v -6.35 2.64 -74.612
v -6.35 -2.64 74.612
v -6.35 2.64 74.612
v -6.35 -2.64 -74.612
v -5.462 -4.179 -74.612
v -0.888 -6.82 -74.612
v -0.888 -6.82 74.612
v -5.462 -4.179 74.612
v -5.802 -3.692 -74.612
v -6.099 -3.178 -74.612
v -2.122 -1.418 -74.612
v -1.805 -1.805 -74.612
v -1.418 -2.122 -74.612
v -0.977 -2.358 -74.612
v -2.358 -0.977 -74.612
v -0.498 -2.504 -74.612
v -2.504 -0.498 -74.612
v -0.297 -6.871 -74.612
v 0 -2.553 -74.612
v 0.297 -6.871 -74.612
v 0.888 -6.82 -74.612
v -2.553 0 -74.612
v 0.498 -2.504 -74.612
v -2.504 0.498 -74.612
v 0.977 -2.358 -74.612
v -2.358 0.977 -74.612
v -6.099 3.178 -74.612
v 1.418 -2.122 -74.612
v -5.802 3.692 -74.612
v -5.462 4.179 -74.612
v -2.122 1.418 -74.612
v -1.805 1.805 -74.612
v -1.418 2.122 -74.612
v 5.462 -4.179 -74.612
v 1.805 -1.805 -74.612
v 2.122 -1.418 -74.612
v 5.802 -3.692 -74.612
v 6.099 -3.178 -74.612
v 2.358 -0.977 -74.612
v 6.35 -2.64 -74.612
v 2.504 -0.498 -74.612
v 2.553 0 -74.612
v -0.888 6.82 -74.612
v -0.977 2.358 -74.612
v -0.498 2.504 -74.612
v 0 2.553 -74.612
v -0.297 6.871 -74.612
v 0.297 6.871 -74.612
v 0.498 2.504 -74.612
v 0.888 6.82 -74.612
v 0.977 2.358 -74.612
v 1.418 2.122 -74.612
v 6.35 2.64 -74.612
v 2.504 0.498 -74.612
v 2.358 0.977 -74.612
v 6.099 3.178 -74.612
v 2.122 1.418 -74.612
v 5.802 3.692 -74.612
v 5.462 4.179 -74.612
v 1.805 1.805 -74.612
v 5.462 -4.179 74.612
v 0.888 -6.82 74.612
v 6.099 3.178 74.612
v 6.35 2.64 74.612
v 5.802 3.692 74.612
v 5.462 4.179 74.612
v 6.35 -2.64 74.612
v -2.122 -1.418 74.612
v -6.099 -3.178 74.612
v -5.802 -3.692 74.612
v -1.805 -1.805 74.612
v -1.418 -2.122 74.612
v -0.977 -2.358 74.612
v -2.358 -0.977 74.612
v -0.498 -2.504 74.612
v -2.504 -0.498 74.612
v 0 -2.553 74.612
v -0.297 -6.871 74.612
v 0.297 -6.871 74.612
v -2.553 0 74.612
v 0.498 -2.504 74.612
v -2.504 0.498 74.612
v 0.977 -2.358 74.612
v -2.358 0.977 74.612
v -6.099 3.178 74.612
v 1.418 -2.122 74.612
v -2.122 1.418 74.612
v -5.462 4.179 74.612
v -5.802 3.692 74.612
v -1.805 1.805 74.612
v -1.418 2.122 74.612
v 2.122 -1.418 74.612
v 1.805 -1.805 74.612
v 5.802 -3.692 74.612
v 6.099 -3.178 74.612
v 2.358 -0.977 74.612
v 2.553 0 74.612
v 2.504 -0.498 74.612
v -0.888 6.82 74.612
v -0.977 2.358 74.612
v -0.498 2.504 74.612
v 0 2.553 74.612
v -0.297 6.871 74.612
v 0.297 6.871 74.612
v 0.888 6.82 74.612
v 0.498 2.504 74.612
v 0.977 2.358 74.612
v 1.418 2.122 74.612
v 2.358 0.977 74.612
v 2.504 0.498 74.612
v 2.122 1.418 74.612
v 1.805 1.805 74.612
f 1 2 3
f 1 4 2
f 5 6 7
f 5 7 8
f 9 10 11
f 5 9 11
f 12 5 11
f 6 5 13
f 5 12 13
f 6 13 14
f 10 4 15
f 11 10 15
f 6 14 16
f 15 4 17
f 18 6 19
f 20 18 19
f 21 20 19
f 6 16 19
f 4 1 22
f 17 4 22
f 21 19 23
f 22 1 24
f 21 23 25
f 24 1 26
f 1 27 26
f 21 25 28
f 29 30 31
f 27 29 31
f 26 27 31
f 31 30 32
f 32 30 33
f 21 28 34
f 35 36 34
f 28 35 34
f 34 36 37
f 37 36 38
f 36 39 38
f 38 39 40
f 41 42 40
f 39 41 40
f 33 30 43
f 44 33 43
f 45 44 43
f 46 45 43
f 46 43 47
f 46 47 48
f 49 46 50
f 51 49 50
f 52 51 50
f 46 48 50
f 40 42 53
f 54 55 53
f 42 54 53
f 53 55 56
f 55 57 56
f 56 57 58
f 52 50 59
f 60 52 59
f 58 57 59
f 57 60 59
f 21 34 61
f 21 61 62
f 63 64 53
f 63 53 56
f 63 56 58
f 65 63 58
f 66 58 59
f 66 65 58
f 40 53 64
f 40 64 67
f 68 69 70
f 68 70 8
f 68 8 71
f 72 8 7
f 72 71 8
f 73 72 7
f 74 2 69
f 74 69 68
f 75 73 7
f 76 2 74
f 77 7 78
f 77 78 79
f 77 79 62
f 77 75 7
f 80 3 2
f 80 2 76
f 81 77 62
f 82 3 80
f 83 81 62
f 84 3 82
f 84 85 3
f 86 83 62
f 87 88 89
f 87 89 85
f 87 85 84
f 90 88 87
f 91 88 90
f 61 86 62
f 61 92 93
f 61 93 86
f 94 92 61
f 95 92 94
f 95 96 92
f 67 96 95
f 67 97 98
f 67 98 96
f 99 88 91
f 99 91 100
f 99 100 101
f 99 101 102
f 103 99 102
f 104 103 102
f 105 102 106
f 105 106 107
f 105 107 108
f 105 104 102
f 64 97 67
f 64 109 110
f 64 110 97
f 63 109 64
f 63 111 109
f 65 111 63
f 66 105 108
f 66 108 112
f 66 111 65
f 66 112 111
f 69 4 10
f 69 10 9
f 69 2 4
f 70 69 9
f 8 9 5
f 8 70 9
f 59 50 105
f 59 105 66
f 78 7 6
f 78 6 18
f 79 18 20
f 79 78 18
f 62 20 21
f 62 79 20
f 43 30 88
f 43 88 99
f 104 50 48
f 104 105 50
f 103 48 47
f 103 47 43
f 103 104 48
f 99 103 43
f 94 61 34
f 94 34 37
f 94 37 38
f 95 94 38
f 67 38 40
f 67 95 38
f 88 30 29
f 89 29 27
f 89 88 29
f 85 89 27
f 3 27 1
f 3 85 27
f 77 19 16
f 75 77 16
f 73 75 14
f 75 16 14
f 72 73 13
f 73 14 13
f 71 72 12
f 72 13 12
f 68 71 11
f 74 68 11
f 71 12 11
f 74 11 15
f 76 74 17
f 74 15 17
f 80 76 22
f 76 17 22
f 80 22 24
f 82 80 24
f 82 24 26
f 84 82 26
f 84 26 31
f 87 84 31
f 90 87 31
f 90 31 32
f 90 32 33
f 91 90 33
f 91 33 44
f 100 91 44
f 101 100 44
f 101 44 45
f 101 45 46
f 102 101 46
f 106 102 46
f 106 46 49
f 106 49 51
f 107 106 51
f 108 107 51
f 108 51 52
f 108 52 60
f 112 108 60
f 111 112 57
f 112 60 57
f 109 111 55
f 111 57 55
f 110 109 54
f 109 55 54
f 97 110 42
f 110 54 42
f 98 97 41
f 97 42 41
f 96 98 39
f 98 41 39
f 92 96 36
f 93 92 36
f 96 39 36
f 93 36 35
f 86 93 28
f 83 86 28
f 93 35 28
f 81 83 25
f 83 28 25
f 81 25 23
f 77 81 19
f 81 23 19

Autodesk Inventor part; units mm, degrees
ref_plane "YZ Plane" through (0, 0, 0) normal (1, 0, 0) x (0, 1, 0)
ref_plane "XZ Plane" through (0, 0, 0) normal (0, 1, 0) x (-1, 0, 0)
ref_plane "XY Plane" through (0, 0, 0) normal (0, 0, 1) x (1, 0, 0)
sketch "Sketch1" plane through (0, 0, 0) normal (0, 0, 1) x (1, 0, 0)
  line L0 (-6.35, -3.6662) -> (-6.35, 3.6662)
  line L1 (-6.35, 3.6662) -> (0, 7.3323)
  line L2 (0, 7.3323) -> (6.35, 3.6662)
  line L3 (6.35, 3.6662) -> (6.35, -3.6662)
  line L4 (6.35, -3.6662) -> (0, -7.3323)
  line L5 (0, -7.3323) -> (-6.35, -3.6662)
  point P0 (0, 0)
  point P1 (0, 0)
  dimension "Size" = 12.7
extrude "Extrusion1" add sketch "Sketch1" along normal mid plane 149.225
sketch "Sketch3" plane through (0, 0, 74.6125) normal (0, 0, 1) x (1, 0, 0)
  line L0 (-6.35, 3.6662) -> (0, 7.3323) construction
  line L1 (0, 7.3323) -> (6.35, 3.6662) construction
  line L2 (6.35, 3.6662) -> (6.35, -3.6662) construction
  line L3 (6.35, -3.6662) -> (0, -7.3323) construction
  line L4 (0, -7.3323) -> (-6.35, -3.6662) construction
  line L5 (-6.35, -3.6662) -> (-6.35, 3.6662) construction
  point P0 (0, 0)
hole "Hole1" at (0, 0, 74.6125) direction (0, 0, -1) diameter 5.1054 end through all
sketch "Sketch4" plane through (0, 0, 74.6125) normal (0, 0, 1) x (1, 0, 0)
  circle A0 centre (0, 0) radius 2.5527 construction
  line L0 (-6.35, 3.6662) -> (0, 7.3323) construction
  line L1 (0, 7.3323) -> (6.35, 3.6662) construction
  line L2 (6.35, 3.6662) -> (6.35, -3.6662) construction
  line L3 (6.35, -3.6662) -> (0, -7.3323) construction
  line L4 (0, -7.3323) -> (-6.35, -3.6662) construction
  line L5 (-6.35, -3.6662) -> (-6.35, 3.6662) construction
  circle A1 centre (0, 0) radius 6.8771
  circle A2 centre (0, 0) radius 8.89
  dimension "thunder" = 13.7541
  dimension "d16" = 17.78
extrude "Extrusion3" cut sketch "Sketch4" against normal through all
equation "\"bearing\" = 25.4"
properties part number "GP3-003" material "Aluminum 6061"
